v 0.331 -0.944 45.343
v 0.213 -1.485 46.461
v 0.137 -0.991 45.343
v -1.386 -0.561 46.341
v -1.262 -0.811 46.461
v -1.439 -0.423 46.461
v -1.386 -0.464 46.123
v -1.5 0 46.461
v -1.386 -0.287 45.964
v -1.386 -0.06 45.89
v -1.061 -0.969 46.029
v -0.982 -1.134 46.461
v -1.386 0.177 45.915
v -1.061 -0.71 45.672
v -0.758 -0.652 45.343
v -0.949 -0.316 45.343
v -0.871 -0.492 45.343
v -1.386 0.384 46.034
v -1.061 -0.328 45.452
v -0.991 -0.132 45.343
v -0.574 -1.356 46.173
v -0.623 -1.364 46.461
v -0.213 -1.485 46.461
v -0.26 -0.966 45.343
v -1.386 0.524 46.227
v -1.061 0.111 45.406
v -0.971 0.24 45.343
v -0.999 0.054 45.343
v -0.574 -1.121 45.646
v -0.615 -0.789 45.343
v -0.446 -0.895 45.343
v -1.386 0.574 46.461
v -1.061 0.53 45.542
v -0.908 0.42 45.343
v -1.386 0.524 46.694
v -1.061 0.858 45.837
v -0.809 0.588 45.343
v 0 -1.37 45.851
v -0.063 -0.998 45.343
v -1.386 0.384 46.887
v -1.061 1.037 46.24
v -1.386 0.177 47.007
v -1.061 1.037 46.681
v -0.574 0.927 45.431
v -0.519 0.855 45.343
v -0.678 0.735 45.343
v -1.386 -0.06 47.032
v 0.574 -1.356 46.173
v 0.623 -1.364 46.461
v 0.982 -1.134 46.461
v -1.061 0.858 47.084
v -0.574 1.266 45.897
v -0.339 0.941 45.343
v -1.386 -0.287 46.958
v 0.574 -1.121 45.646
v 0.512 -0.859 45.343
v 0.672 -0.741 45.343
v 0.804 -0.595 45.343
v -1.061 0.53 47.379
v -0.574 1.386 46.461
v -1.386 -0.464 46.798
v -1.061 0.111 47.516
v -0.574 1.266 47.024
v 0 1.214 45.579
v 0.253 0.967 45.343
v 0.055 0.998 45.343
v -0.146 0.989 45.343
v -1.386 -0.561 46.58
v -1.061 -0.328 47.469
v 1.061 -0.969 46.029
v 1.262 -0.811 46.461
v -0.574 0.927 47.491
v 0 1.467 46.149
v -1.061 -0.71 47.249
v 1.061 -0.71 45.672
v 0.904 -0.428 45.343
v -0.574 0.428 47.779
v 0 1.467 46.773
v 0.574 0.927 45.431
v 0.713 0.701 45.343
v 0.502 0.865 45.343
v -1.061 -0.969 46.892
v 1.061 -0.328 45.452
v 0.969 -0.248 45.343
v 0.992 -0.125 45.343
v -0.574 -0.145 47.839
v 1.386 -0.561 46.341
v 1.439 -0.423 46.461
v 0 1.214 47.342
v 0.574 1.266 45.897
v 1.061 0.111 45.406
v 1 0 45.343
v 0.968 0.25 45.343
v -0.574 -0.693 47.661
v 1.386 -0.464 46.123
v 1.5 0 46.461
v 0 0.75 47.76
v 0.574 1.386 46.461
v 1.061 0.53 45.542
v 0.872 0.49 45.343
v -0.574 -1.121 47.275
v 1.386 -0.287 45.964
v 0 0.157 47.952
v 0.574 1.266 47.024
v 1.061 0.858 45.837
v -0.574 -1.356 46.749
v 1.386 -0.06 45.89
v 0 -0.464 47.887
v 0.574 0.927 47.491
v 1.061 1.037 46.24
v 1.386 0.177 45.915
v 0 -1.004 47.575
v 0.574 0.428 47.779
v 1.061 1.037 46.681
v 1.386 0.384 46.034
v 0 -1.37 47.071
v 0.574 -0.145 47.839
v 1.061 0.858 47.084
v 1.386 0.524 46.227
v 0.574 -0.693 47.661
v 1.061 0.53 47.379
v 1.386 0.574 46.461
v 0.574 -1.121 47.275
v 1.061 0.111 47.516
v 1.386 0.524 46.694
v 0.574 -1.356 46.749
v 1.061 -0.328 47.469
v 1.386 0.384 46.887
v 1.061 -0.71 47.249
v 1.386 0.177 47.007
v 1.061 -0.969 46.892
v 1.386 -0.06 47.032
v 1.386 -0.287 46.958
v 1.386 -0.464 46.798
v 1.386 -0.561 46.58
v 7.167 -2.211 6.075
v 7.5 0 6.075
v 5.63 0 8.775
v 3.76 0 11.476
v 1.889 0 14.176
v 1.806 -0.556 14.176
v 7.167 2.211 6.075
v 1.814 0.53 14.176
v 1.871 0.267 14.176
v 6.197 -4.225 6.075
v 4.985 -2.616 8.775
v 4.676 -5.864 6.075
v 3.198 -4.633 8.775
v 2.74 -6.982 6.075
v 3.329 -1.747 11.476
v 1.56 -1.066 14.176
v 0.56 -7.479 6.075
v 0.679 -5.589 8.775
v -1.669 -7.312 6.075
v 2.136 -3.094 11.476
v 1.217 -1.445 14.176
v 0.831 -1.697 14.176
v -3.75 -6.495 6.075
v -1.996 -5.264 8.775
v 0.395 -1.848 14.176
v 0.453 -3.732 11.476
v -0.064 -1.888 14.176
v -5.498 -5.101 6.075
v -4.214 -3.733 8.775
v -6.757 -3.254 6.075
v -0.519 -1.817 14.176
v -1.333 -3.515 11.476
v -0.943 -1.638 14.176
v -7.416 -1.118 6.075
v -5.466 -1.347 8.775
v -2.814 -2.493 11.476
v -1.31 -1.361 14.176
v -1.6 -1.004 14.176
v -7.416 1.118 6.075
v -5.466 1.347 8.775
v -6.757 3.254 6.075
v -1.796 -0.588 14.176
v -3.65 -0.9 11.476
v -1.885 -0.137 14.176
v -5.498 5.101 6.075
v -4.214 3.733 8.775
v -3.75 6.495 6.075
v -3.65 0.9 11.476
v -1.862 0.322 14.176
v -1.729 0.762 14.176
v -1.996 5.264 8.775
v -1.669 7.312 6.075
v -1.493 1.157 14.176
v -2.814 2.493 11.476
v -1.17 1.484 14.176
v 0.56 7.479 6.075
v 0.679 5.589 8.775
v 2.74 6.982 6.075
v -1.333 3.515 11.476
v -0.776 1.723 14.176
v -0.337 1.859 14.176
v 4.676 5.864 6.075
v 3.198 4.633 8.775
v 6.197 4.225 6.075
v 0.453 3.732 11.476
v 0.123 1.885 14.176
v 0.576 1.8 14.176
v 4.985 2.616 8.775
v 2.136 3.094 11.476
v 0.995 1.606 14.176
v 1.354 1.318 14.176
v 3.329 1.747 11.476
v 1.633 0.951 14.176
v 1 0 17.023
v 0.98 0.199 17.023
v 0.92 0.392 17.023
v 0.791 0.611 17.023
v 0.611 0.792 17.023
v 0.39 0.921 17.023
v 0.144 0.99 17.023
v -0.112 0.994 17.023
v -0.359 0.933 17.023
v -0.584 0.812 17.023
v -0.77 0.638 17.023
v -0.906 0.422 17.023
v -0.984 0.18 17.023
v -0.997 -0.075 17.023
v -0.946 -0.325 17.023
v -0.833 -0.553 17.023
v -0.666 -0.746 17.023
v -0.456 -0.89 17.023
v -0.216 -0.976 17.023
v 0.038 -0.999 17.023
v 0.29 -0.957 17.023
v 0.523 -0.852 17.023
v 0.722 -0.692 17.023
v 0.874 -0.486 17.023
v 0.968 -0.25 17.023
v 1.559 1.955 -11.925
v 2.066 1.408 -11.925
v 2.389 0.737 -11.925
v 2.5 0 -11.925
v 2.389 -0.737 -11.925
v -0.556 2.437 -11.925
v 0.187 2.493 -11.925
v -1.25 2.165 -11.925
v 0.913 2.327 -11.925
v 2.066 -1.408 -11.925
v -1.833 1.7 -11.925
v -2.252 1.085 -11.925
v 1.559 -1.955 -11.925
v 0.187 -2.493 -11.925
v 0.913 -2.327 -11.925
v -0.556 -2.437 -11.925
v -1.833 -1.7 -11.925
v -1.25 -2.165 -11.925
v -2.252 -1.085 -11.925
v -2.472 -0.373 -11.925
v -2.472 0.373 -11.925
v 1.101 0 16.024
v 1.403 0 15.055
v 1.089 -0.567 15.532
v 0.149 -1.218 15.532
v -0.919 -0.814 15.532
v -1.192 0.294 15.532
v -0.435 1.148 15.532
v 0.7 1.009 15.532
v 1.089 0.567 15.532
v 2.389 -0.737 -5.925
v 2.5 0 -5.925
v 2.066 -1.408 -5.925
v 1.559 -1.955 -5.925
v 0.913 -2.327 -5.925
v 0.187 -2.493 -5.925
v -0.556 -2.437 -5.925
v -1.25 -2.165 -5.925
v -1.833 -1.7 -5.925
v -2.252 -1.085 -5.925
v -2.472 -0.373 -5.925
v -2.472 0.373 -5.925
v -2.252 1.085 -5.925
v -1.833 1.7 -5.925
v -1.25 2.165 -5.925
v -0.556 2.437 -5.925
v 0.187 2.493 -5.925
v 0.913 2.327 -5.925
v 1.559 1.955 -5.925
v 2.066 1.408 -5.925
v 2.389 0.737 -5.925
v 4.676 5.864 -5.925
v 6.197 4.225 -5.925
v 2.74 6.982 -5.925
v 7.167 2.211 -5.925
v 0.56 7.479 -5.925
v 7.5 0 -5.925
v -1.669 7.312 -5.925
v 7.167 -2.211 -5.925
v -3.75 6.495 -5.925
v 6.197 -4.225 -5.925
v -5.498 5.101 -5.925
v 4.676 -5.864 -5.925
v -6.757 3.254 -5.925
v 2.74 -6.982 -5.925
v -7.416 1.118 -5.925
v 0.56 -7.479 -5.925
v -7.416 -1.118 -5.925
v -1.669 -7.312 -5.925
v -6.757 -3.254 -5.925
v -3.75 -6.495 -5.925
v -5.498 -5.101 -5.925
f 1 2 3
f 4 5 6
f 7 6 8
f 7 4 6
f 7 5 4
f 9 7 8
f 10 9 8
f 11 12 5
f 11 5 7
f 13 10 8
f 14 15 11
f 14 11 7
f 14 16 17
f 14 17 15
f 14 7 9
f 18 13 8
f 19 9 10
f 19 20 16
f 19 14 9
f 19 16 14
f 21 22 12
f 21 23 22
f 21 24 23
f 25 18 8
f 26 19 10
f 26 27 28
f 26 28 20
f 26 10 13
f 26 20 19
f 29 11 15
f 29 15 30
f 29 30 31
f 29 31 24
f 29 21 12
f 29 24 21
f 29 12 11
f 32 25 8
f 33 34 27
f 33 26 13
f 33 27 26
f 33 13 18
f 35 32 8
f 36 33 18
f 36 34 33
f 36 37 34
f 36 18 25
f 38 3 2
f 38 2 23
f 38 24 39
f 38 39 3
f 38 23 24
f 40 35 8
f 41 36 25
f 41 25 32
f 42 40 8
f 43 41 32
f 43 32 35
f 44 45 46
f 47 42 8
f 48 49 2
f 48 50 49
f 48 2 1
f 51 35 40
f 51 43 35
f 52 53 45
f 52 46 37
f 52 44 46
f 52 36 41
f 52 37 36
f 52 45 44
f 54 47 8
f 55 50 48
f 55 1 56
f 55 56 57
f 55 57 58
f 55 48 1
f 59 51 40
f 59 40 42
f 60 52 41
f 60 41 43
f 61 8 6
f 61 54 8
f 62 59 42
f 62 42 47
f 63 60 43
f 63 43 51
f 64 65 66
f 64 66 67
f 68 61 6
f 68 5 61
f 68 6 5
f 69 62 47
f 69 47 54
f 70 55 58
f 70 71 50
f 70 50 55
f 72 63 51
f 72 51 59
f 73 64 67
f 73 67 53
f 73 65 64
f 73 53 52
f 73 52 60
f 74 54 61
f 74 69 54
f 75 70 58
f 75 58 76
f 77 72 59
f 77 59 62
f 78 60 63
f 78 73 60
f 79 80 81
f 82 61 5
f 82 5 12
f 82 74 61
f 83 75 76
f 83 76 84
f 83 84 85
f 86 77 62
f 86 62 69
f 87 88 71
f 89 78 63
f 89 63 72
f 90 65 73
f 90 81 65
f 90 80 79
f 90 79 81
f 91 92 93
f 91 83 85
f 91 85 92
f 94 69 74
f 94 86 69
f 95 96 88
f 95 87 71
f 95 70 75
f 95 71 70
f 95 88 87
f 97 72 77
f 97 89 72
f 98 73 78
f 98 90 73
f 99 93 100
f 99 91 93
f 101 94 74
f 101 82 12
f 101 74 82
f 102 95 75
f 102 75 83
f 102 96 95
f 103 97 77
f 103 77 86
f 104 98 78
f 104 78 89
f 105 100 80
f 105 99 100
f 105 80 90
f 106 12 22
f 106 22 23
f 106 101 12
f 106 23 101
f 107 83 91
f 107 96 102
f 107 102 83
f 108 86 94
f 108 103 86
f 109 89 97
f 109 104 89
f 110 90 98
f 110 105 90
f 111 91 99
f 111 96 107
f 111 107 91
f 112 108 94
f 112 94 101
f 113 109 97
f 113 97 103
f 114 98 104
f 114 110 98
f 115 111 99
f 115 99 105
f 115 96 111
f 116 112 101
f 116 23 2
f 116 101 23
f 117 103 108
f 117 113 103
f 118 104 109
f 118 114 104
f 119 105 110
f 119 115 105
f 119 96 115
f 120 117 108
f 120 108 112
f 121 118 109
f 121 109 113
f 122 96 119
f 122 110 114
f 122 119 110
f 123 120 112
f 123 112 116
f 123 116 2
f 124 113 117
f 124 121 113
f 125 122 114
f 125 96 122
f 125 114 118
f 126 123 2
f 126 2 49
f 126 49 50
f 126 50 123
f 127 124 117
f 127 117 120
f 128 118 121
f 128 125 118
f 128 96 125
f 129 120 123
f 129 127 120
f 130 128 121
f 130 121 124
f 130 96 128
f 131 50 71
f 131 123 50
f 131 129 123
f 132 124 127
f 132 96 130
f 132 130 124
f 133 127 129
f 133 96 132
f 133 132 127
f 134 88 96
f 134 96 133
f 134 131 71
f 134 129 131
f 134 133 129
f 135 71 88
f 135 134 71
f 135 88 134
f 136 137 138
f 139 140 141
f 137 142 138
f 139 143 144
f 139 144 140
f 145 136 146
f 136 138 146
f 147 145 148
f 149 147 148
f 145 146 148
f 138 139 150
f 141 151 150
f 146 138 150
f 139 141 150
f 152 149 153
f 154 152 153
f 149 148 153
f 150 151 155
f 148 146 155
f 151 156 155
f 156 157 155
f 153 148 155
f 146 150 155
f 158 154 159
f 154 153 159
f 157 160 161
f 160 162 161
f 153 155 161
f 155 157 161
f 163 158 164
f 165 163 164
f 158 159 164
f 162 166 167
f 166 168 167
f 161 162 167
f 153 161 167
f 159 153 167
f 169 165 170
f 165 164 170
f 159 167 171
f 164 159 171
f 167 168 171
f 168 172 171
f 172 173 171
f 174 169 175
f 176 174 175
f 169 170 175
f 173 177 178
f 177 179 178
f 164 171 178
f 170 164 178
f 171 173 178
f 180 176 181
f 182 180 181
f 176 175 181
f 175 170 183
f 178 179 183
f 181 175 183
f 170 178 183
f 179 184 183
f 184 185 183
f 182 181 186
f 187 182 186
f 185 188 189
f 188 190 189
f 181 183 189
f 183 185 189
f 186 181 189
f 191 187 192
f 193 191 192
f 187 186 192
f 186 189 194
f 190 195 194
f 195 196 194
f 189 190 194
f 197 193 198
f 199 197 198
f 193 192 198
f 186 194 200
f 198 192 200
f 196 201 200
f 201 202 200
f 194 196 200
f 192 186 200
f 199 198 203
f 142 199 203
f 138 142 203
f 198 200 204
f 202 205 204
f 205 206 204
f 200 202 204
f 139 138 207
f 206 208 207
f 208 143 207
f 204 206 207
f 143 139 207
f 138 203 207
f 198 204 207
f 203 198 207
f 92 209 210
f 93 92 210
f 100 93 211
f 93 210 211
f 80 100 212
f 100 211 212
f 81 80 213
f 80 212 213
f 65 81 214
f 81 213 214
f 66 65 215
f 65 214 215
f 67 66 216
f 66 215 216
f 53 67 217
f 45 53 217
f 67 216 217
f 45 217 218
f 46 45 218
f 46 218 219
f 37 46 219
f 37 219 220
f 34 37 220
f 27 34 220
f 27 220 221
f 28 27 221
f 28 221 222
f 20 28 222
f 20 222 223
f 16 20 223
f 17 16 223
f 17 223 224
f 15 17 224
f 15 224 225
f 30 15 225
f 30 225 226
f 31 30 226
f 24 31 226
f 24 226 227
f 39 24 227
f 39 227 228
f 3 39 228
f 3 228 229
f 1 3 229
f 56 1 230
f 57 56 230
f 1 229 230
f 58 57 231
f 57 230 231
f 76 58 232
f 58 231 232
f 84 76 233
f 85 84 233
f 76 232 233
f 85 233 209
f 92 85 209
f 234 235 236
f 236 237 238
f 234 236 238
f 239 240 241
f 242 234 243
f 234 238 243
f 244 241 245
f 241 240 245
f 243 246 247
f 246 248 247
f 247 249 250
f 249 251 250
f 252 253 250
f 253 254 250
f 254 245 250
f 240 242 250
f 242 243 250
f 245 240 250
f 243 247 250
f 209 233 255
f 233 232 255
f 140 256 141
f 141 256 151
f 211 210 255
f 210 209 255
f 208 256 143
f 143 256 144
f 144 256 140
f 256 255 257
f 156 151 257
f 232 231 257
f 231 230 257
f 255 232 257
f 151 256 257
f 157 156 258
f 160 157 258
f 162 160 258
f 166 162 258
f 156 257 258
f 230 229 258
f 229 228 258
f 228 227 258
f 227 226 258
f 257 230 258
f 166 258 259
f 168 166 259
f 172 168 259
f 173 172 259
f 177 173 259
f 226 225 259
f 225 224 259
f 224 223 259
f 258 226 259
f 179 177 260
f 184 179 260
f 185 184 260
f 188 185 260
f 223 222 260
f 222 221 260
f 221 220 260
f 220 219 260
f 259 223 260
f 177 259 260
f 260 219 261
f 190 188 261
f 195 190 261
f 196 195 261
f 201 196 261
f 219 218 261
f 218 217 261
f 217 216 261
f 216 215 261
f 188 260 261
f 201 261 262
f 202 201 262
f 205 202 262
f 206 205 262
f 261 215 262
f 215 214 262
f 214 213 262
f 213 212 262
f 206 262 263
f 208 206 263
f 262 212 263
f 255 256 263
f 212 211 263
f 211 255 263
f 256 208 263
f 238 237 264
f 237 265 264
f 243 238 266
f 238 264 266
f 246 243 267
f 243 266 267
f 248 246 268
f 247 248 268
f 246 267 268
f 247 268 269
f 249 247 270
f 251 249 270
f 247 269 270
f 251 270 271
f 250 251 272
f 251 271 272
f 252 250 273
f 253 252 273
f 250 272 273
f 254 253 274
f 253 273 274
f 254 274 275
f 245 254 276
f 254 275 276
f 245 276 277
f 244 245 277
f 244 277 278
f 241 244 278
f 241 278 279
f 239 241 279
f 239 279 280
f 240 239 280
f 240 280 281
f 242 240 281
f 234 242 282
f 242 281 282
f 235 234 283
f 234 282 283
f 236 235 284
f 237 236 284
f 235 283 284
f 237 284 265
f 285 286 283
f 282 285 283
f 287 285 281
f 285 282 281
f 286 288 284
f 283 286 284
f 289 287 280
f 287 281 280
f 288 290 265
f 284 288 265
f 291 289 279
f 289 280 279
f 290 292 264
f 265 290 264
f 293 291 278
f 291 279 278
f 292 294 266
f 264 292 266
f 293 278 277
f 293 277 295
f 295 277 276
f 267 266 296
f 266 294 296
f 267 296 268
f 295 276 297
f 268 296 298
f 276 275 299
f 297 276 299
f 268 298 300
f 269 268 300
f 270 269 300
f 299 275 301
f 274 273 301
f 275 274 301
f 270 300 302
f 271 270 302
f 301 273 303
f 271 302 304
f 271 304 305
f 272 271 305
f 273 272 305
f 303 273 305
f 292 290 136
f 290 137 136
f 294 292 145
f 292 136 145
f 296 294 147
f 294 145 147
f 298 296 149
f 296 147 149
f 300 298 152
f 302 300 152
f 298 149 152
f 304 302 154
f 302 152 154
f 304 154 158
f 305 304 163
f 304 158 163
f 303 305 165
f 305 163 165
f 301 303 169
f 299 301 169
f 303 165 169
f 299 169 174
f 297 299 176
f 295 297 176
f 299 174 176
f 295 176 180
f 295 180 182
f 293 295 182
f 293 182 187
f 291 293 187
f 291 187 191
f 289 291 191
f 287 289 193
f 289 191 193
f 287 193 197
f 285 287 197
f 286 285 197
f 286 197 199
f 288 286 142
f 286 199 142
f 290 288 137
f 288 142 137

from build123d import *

# Parameters (mm, degrees)
SKETCH2_R           = 1
BOSS_EXTRUDE1_DEPTH = 30
FILLET1_R           = 5


with BuildPart() as part:
    # Sketch1 → Revolve1 (revolve)
    with BuildSketch(Plane(origin=(0, 0, 0), x_dir=(1, 0, 0), z_dir=(0, 1, 0))):
        Polygon((0, 0), (0, 11.925), (2.5, 11.925), (2.5, 5.925), (7.5, 5.925), (7.5, -6.075), (1, -15.460714286), (0, -15.460714286), align=None)
    revolve(axis=Axis((0, 0, 0), (0, 0, -1)))

    # Sketch2 → Boss-Extrude1 (add)
    with BuildSketch(Plane.XY.offset(15.460714286)):
        Circle(SKETCH2_R)
    extrude(amount=BOSS_EXTRUDE1_DEPTH)

    # Fillet1
    fillet1_edges = [part.edges().sort_by_distance(p)[0] for p in [
        (-1, 0, 15.460714286),
    ]]
    fillet(fillet1_edges, radius=FILLET1_R)

    # Sketch4 → Revolve8 (revolve)
    with BuildSketch(Plane(origin=(0, 0, 46.460714286), x_dir=(-1, 0, 0), z_dir=(0, 0, -1))):
        with BuildLine():
            Line((-1.5, 0), (1.5, 0))
            ThreePointArc((1.5, 0), (0, -1.5), (-1.5, 0))
        make_face()
    revolve(axis=Axis((-1.5, 0, 46.460714286), (1, 0, 0)))


solid = part.part
